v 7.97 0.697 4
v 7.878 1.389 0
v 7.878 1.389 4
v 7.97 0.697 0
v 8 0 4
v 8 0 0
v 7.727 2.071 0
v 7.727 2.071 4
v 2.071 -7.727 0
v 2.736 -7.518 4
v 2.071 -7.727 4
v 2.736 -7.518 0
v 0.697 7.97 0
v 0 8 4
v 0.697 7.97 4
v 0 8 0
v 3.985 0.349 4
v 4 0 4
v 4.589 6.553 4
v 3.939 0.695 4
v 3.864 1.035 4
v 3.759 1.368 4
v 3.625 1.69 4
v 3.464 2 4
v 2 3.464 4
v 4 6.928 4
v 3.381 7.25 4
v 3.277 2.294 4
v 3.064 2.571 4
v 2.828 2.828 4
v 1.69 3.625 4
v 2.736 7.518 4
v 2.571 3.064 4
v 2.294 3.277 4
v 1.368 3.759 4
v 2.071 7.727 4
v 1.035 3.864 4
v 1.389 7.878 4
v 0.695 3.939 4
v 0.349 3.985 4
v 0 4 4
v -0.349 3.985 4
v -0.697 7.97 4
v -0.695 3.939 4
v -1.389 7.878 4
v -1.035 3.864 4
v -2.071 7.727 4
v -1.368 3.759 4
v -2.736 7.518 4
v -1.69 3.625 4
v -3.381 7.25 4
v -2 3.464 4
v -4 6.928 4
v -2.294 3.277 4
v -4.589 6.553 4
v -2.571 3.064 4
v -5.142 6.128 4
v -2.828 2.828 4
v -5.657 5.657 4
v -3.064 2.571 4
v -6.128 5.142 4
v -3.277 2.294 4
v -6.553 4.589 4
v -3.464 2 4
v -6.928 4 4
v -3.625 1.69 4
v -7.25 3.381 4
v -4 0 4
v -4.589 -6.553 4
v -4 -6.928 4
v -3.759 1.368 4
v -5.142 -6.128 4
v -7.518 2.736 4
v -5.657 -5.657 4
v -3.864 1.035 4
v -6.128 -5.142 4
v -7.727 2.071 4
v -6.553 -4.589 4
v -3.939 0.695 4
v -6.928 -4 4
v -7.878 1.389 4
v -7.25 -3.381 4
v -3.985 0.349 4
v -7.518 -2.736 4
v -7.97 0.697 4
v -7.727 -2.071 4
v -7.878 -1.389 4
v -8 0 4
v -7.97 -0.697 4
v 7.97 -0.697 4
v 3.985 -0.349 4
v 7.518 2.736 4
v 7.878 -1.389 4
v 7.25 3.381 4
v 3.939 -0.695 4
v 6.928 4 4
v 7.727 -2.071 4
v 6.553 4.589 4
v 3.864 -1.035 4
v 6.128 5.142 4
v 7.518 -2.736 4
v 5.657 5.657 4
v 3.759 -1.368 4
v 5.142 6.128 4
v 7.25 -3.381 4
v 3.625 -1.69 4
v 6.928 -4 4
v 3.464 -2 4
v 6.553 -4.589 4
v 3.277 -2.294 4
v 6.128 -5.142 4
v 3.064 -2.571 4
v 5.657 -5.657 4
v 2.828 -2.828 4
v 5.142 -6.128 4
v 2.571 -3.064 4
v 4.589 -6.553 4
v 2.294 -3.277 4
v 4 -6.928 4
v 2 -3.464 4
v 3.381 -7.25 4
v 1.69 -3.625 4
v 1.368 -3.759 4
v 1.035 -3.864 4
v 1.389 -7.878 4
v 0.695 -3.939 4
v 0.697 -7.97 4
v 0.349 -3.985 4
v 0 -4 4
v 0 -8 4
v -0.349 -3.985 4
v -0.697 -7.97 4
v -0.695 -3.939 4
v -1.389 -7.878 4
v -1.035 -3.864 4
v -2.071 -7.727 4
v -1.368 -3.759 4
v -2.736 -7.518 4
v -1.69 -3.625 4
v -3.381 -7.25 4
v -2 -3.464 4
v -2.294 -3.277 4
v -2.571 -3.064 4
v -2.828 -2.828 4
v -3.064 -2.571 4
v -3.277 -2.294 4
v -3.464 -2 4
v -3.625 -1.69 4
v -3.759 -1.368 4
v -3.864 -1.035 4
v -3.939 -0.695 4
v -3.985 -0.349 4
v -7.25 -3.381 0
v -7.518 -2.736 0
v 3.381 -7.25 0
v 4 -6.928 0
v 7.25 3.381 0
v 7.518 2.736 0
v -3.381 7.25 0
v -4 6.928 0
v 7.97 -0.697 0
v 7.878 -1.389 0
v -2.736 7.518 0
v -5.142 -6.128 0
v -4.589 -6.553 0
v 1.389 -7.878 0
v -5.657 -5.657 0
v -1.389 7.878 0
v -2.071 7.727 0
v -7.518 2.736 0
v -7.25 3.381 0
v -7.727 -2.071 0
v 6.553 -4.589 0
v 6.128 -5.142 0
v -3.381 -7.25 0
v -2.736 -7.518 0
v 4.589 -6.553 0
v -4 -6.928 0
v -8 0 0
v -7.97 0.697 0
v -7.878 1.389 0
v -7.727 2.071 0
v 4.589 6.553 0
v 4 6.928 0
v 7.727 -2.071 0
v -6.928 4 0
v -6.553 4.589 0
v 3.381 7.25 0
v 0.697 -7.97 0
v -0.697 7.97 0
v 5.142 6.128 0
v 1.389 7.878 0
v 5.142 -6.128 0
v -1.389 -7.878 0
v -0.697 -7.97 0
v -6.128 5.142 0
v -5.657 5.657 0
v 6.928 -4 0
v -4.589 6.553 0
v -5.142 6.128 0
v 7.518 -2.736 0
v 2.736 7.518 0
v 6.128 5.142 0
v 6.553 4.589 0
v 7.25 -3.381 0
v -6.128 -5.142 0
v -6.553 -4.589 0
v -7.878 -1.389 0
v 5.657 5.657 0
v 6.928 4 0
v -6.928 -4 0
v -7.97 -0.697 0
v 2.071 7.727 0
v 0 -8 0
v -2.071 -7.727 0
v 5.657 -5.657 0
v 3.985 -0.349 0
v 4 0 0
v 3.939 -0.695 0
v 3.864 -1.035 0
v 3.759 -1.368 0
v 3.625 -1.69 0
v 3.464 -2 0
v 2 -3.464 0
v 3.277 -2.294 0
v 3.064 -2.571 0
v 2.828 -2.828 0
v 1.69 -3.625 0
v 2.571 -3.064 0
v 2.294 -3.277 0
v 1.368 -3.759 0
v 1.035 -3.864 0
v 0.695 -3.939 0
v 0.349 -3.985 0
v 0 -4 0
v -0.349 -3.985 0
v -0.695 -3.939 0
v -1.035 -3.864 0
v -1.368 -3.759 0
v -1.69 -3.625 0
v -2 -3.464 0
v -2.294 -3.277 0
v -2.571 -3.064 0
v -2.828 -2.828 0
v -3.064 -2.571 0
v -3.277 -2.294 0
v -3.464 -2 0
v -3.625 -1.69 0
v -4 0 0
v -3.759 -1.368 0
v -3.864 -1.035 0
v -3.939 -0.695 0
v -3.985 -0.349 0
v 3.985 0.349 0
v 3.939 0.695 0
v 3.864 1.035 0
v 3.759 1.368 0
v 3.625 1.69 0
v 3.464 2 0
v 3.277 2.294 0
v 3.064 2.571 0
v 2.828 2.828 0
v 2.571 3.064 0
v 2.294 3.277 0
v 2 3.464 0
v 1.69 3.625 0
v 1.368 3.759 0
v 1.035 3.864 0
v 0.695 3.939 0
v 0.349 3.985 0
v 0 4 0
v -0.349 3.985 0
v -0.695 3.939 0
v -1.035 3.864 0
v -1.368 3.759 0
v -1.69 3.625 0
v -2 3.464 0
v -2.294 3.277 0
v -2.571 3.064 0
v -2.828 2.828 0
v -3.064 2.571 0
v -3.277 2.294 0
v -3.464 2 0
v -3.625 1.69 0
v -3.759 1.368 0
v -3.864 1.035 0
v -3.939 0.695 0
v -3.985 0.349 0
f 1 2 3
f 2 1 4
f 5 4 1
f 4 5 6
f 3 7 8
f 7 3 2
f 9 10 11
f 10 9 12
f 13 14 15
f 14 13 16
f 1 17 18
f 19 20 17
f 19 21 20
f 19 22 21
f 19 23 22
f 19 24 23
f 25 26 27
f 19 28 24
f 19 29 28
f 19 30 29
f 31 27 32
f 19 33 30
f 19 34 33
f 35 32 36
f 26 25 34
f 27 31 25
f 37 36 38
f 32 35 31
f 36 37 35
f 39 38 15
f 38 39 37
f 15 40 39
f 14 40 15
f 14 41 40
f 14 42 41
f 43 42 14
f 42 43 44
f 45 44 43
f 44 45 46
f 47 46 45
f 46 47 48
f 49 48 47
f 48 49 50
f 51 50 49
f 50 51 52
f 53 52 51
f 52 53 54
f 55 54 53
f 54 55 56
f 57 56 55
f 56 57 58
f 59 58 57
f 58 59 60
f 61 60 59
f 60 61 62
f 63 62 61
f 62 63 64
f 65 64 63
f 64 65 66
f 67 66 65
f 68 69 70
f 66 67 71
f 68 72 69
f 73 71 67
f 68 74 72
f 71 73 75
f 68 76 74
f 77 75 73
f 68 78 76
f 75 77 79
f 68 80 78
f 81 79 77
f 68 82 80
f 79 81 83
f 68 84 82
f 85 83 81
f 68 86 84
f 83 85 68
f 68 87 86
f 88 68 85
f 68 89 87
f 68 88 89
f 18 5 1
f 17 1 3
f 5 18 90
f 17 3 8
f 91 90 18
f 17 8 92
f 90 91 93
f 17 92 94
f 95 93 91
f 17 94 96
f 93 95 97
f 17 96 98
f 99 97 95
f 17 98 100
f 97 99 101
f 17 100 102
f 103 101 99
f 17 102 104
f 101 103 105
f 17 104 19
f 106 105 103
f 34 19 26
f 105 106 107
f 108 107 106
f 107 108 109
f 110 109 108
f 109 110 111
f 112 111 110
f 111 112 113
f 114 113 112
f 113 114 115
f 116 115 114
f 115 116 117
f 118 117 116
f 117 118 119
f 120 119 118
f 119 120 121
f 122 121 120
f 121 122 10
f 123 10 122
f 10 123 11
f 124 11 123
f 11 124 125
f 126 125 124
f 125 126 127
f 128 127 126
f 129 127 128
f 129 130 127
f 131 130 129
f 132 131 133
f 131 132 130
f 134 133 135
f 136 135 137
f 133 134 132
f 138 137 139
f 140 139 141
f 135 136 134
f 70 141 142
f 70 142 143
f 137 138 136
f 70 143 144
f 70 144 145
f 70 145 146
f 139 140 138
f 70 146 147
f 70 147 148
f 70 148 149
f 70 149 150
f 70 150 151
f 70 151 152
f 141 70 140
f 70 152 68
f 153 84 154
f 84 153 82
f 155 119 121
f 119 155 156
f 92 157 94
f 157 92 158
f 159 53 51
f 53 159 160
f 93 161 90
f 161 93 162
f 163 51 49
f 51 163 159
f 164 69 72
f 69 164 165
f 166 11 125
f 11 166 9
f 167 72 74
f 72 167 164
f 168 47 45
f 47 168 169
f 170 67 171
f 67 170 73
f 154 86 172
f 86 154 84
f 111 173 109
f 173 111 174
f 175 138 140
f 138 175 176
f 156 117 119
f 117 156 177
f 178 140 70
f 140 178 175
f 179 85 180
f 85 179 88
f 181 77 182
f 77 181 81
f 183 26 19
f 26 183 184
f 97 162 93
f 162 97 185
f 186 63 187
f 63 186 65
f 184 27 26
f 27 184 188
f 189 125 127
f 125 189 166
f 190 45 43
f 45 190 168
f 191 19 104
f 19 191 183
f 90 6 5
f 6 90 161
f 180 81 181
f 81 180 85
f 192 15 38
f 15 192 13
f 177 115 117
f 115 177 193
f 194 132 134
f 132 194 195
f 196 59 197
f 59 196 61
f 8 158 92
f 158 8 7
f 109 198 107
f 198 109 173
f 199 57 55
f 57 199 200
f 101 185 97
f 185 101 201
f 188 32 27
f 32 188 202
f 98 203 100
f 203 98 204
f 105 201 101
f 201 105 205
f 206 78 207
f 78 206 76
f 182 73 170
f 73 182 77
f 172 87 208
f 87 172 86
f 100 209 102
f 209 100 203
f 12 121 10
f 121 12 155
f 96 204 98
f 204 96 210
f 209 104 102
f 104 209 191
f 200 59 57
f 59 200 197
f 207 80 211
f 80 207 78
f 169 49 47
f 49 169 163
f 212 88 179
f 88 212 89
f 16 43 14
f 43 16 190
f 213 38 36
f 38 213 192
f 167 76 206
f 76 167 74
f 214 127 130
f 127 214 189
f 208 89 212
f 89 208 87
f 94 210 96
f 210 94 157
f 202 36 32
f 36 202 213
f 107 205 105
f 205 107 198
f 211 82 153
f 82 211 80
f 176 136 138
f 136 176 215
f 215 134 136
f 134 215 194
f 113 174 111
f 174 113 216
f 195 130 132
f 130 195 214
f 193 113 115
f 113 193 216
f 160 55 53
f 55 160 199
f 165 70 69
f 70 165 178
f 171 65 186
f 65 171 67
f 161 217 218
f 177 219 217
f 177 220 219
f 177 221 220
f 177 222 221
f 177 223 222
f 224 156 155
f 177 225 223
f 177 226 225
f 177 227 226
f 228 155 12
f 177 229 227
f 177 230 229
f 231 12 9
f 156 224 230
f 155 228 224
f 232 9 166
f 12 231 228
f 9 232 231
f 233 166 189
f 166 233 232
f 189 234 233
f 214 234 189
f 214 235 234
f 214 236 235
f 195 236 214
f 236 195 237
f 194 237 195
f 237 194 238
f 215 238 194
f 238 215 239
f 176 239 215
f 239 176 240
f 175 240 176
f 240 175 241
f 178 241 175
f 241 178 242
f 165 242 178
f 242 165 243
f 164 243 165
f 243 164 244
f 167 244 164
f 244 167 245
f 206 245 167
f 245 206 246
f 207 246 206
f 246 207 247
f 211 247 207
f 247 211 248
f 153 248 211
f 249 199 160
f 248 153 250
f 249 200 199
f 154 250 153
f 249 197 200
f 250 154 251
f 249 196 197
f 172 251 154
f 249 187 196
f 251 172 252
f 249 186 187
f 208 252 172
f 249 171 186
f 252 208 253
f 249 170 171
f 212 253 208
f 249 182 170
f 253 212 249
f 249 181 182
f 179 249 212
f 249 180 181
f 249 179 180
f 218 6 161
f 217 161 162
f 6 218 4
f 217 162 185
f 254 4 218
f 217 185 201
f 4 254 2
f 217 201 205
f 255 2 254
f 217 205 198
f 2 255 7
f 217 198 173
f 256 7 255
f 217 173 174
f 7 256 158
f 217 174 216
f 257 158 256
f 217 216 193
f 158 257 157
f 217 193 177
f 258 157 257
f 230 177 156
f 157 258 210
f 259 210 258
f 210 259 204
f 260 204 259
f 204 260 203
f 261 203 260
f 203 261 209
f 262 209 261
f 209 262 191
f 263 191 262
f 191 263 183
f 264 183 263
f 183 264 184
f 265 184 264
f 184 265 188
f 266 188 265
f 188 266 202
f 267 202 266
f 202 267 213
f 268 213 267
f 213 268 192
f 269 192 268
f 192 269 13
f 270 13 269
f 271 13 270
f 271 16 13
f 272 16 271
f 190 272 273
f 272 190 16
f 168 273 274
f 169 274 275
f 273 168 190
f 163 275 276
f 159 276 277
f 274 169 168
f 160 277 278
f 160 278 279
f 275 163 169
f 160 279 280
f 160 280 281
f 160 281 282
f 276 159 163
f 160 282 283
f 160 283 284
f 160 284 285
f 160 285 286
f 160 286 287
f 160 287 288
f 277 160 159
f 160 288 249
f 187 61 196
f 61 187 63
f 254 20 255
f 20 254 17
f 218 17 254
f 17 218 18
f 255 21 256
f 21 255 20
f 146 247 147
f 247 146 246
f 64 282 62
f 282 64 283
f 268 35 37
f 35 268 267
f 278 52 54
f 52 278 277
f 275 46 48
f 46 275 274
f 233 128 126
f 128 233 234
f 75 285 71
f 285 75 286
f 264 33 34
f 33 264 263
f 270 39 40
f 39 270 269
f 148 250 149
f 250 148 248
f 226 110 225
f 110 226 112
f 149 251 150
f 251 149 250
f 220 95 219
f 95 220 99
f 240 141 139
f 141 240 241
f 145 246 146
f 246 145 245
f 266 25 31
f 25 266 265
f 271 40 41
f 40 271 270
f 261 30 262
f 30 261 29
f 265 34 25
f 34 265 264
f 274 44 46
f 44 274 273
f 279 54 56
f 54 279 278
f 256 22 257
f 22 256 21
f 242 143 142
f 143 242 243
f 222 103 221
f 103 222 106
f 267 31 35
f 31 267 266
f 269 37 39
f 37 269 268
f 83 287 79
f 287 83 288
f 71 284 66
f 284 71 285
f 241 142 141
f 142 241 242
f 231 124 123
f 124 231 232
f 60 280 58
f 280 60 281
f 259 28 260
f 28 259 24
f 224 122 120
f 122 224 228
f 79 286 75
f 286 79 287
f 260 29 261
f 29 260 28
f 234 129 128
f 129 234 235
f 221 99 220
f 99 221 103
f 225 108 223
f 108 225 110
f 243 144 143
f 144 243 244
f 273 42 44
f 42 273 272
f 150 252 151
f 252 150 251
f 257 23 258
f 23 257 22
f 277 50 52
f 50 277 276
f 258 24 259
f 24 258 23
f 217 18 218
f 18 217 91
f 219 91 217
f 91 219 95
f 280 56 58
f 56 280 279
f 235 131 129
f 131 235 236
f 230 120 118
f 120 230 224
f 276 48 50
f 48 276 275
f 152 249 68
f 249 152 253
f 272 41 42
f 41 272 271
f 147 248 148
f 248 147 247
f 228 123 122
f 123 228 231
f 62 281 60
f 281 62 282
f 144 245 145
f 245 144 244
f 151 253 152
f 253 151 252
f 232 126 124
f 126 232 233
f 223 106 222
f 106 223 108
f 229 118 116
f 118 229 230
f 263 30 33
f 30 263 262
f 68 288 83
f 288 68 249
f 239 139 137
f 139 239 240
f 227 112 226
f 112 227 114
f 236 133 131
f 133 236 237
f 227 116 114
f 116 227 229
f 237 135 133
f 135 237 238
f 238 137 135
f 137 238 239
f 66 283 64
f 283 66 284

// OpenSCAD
/*
 * A small soap box car
 * 
 * lets replace the wheels by spheres 
 * and make it parametric 
 */

// set the model resolution
// $fa minimum angle for a fragment
// circles have 360 / $fa fragments
// minimal value = 0.01
$fa = 1;

// $fs minimum size of a fragment
$fs = 0.4;

$fn = 72;

axle_radius = 0.5;
axle_length = 43;

body_height = 8;
body_width = 20;
body_length = 50;

top_height = 7;
top_width = 18;
top_length = 30;

wheel_radius = 8;
wheel_width = 4;
wheel_gap = 5;
wheel_distance = (body_width / 2 + wheel_width / 2 + wheel_gap);

track = 15;

difference () {
cylinder(h=wheel_width,r=wheel_radius);

translate([0,0, -0.001])
cylinder(h=wheel_width+ 1,r=wheel_radius / 2);

}
